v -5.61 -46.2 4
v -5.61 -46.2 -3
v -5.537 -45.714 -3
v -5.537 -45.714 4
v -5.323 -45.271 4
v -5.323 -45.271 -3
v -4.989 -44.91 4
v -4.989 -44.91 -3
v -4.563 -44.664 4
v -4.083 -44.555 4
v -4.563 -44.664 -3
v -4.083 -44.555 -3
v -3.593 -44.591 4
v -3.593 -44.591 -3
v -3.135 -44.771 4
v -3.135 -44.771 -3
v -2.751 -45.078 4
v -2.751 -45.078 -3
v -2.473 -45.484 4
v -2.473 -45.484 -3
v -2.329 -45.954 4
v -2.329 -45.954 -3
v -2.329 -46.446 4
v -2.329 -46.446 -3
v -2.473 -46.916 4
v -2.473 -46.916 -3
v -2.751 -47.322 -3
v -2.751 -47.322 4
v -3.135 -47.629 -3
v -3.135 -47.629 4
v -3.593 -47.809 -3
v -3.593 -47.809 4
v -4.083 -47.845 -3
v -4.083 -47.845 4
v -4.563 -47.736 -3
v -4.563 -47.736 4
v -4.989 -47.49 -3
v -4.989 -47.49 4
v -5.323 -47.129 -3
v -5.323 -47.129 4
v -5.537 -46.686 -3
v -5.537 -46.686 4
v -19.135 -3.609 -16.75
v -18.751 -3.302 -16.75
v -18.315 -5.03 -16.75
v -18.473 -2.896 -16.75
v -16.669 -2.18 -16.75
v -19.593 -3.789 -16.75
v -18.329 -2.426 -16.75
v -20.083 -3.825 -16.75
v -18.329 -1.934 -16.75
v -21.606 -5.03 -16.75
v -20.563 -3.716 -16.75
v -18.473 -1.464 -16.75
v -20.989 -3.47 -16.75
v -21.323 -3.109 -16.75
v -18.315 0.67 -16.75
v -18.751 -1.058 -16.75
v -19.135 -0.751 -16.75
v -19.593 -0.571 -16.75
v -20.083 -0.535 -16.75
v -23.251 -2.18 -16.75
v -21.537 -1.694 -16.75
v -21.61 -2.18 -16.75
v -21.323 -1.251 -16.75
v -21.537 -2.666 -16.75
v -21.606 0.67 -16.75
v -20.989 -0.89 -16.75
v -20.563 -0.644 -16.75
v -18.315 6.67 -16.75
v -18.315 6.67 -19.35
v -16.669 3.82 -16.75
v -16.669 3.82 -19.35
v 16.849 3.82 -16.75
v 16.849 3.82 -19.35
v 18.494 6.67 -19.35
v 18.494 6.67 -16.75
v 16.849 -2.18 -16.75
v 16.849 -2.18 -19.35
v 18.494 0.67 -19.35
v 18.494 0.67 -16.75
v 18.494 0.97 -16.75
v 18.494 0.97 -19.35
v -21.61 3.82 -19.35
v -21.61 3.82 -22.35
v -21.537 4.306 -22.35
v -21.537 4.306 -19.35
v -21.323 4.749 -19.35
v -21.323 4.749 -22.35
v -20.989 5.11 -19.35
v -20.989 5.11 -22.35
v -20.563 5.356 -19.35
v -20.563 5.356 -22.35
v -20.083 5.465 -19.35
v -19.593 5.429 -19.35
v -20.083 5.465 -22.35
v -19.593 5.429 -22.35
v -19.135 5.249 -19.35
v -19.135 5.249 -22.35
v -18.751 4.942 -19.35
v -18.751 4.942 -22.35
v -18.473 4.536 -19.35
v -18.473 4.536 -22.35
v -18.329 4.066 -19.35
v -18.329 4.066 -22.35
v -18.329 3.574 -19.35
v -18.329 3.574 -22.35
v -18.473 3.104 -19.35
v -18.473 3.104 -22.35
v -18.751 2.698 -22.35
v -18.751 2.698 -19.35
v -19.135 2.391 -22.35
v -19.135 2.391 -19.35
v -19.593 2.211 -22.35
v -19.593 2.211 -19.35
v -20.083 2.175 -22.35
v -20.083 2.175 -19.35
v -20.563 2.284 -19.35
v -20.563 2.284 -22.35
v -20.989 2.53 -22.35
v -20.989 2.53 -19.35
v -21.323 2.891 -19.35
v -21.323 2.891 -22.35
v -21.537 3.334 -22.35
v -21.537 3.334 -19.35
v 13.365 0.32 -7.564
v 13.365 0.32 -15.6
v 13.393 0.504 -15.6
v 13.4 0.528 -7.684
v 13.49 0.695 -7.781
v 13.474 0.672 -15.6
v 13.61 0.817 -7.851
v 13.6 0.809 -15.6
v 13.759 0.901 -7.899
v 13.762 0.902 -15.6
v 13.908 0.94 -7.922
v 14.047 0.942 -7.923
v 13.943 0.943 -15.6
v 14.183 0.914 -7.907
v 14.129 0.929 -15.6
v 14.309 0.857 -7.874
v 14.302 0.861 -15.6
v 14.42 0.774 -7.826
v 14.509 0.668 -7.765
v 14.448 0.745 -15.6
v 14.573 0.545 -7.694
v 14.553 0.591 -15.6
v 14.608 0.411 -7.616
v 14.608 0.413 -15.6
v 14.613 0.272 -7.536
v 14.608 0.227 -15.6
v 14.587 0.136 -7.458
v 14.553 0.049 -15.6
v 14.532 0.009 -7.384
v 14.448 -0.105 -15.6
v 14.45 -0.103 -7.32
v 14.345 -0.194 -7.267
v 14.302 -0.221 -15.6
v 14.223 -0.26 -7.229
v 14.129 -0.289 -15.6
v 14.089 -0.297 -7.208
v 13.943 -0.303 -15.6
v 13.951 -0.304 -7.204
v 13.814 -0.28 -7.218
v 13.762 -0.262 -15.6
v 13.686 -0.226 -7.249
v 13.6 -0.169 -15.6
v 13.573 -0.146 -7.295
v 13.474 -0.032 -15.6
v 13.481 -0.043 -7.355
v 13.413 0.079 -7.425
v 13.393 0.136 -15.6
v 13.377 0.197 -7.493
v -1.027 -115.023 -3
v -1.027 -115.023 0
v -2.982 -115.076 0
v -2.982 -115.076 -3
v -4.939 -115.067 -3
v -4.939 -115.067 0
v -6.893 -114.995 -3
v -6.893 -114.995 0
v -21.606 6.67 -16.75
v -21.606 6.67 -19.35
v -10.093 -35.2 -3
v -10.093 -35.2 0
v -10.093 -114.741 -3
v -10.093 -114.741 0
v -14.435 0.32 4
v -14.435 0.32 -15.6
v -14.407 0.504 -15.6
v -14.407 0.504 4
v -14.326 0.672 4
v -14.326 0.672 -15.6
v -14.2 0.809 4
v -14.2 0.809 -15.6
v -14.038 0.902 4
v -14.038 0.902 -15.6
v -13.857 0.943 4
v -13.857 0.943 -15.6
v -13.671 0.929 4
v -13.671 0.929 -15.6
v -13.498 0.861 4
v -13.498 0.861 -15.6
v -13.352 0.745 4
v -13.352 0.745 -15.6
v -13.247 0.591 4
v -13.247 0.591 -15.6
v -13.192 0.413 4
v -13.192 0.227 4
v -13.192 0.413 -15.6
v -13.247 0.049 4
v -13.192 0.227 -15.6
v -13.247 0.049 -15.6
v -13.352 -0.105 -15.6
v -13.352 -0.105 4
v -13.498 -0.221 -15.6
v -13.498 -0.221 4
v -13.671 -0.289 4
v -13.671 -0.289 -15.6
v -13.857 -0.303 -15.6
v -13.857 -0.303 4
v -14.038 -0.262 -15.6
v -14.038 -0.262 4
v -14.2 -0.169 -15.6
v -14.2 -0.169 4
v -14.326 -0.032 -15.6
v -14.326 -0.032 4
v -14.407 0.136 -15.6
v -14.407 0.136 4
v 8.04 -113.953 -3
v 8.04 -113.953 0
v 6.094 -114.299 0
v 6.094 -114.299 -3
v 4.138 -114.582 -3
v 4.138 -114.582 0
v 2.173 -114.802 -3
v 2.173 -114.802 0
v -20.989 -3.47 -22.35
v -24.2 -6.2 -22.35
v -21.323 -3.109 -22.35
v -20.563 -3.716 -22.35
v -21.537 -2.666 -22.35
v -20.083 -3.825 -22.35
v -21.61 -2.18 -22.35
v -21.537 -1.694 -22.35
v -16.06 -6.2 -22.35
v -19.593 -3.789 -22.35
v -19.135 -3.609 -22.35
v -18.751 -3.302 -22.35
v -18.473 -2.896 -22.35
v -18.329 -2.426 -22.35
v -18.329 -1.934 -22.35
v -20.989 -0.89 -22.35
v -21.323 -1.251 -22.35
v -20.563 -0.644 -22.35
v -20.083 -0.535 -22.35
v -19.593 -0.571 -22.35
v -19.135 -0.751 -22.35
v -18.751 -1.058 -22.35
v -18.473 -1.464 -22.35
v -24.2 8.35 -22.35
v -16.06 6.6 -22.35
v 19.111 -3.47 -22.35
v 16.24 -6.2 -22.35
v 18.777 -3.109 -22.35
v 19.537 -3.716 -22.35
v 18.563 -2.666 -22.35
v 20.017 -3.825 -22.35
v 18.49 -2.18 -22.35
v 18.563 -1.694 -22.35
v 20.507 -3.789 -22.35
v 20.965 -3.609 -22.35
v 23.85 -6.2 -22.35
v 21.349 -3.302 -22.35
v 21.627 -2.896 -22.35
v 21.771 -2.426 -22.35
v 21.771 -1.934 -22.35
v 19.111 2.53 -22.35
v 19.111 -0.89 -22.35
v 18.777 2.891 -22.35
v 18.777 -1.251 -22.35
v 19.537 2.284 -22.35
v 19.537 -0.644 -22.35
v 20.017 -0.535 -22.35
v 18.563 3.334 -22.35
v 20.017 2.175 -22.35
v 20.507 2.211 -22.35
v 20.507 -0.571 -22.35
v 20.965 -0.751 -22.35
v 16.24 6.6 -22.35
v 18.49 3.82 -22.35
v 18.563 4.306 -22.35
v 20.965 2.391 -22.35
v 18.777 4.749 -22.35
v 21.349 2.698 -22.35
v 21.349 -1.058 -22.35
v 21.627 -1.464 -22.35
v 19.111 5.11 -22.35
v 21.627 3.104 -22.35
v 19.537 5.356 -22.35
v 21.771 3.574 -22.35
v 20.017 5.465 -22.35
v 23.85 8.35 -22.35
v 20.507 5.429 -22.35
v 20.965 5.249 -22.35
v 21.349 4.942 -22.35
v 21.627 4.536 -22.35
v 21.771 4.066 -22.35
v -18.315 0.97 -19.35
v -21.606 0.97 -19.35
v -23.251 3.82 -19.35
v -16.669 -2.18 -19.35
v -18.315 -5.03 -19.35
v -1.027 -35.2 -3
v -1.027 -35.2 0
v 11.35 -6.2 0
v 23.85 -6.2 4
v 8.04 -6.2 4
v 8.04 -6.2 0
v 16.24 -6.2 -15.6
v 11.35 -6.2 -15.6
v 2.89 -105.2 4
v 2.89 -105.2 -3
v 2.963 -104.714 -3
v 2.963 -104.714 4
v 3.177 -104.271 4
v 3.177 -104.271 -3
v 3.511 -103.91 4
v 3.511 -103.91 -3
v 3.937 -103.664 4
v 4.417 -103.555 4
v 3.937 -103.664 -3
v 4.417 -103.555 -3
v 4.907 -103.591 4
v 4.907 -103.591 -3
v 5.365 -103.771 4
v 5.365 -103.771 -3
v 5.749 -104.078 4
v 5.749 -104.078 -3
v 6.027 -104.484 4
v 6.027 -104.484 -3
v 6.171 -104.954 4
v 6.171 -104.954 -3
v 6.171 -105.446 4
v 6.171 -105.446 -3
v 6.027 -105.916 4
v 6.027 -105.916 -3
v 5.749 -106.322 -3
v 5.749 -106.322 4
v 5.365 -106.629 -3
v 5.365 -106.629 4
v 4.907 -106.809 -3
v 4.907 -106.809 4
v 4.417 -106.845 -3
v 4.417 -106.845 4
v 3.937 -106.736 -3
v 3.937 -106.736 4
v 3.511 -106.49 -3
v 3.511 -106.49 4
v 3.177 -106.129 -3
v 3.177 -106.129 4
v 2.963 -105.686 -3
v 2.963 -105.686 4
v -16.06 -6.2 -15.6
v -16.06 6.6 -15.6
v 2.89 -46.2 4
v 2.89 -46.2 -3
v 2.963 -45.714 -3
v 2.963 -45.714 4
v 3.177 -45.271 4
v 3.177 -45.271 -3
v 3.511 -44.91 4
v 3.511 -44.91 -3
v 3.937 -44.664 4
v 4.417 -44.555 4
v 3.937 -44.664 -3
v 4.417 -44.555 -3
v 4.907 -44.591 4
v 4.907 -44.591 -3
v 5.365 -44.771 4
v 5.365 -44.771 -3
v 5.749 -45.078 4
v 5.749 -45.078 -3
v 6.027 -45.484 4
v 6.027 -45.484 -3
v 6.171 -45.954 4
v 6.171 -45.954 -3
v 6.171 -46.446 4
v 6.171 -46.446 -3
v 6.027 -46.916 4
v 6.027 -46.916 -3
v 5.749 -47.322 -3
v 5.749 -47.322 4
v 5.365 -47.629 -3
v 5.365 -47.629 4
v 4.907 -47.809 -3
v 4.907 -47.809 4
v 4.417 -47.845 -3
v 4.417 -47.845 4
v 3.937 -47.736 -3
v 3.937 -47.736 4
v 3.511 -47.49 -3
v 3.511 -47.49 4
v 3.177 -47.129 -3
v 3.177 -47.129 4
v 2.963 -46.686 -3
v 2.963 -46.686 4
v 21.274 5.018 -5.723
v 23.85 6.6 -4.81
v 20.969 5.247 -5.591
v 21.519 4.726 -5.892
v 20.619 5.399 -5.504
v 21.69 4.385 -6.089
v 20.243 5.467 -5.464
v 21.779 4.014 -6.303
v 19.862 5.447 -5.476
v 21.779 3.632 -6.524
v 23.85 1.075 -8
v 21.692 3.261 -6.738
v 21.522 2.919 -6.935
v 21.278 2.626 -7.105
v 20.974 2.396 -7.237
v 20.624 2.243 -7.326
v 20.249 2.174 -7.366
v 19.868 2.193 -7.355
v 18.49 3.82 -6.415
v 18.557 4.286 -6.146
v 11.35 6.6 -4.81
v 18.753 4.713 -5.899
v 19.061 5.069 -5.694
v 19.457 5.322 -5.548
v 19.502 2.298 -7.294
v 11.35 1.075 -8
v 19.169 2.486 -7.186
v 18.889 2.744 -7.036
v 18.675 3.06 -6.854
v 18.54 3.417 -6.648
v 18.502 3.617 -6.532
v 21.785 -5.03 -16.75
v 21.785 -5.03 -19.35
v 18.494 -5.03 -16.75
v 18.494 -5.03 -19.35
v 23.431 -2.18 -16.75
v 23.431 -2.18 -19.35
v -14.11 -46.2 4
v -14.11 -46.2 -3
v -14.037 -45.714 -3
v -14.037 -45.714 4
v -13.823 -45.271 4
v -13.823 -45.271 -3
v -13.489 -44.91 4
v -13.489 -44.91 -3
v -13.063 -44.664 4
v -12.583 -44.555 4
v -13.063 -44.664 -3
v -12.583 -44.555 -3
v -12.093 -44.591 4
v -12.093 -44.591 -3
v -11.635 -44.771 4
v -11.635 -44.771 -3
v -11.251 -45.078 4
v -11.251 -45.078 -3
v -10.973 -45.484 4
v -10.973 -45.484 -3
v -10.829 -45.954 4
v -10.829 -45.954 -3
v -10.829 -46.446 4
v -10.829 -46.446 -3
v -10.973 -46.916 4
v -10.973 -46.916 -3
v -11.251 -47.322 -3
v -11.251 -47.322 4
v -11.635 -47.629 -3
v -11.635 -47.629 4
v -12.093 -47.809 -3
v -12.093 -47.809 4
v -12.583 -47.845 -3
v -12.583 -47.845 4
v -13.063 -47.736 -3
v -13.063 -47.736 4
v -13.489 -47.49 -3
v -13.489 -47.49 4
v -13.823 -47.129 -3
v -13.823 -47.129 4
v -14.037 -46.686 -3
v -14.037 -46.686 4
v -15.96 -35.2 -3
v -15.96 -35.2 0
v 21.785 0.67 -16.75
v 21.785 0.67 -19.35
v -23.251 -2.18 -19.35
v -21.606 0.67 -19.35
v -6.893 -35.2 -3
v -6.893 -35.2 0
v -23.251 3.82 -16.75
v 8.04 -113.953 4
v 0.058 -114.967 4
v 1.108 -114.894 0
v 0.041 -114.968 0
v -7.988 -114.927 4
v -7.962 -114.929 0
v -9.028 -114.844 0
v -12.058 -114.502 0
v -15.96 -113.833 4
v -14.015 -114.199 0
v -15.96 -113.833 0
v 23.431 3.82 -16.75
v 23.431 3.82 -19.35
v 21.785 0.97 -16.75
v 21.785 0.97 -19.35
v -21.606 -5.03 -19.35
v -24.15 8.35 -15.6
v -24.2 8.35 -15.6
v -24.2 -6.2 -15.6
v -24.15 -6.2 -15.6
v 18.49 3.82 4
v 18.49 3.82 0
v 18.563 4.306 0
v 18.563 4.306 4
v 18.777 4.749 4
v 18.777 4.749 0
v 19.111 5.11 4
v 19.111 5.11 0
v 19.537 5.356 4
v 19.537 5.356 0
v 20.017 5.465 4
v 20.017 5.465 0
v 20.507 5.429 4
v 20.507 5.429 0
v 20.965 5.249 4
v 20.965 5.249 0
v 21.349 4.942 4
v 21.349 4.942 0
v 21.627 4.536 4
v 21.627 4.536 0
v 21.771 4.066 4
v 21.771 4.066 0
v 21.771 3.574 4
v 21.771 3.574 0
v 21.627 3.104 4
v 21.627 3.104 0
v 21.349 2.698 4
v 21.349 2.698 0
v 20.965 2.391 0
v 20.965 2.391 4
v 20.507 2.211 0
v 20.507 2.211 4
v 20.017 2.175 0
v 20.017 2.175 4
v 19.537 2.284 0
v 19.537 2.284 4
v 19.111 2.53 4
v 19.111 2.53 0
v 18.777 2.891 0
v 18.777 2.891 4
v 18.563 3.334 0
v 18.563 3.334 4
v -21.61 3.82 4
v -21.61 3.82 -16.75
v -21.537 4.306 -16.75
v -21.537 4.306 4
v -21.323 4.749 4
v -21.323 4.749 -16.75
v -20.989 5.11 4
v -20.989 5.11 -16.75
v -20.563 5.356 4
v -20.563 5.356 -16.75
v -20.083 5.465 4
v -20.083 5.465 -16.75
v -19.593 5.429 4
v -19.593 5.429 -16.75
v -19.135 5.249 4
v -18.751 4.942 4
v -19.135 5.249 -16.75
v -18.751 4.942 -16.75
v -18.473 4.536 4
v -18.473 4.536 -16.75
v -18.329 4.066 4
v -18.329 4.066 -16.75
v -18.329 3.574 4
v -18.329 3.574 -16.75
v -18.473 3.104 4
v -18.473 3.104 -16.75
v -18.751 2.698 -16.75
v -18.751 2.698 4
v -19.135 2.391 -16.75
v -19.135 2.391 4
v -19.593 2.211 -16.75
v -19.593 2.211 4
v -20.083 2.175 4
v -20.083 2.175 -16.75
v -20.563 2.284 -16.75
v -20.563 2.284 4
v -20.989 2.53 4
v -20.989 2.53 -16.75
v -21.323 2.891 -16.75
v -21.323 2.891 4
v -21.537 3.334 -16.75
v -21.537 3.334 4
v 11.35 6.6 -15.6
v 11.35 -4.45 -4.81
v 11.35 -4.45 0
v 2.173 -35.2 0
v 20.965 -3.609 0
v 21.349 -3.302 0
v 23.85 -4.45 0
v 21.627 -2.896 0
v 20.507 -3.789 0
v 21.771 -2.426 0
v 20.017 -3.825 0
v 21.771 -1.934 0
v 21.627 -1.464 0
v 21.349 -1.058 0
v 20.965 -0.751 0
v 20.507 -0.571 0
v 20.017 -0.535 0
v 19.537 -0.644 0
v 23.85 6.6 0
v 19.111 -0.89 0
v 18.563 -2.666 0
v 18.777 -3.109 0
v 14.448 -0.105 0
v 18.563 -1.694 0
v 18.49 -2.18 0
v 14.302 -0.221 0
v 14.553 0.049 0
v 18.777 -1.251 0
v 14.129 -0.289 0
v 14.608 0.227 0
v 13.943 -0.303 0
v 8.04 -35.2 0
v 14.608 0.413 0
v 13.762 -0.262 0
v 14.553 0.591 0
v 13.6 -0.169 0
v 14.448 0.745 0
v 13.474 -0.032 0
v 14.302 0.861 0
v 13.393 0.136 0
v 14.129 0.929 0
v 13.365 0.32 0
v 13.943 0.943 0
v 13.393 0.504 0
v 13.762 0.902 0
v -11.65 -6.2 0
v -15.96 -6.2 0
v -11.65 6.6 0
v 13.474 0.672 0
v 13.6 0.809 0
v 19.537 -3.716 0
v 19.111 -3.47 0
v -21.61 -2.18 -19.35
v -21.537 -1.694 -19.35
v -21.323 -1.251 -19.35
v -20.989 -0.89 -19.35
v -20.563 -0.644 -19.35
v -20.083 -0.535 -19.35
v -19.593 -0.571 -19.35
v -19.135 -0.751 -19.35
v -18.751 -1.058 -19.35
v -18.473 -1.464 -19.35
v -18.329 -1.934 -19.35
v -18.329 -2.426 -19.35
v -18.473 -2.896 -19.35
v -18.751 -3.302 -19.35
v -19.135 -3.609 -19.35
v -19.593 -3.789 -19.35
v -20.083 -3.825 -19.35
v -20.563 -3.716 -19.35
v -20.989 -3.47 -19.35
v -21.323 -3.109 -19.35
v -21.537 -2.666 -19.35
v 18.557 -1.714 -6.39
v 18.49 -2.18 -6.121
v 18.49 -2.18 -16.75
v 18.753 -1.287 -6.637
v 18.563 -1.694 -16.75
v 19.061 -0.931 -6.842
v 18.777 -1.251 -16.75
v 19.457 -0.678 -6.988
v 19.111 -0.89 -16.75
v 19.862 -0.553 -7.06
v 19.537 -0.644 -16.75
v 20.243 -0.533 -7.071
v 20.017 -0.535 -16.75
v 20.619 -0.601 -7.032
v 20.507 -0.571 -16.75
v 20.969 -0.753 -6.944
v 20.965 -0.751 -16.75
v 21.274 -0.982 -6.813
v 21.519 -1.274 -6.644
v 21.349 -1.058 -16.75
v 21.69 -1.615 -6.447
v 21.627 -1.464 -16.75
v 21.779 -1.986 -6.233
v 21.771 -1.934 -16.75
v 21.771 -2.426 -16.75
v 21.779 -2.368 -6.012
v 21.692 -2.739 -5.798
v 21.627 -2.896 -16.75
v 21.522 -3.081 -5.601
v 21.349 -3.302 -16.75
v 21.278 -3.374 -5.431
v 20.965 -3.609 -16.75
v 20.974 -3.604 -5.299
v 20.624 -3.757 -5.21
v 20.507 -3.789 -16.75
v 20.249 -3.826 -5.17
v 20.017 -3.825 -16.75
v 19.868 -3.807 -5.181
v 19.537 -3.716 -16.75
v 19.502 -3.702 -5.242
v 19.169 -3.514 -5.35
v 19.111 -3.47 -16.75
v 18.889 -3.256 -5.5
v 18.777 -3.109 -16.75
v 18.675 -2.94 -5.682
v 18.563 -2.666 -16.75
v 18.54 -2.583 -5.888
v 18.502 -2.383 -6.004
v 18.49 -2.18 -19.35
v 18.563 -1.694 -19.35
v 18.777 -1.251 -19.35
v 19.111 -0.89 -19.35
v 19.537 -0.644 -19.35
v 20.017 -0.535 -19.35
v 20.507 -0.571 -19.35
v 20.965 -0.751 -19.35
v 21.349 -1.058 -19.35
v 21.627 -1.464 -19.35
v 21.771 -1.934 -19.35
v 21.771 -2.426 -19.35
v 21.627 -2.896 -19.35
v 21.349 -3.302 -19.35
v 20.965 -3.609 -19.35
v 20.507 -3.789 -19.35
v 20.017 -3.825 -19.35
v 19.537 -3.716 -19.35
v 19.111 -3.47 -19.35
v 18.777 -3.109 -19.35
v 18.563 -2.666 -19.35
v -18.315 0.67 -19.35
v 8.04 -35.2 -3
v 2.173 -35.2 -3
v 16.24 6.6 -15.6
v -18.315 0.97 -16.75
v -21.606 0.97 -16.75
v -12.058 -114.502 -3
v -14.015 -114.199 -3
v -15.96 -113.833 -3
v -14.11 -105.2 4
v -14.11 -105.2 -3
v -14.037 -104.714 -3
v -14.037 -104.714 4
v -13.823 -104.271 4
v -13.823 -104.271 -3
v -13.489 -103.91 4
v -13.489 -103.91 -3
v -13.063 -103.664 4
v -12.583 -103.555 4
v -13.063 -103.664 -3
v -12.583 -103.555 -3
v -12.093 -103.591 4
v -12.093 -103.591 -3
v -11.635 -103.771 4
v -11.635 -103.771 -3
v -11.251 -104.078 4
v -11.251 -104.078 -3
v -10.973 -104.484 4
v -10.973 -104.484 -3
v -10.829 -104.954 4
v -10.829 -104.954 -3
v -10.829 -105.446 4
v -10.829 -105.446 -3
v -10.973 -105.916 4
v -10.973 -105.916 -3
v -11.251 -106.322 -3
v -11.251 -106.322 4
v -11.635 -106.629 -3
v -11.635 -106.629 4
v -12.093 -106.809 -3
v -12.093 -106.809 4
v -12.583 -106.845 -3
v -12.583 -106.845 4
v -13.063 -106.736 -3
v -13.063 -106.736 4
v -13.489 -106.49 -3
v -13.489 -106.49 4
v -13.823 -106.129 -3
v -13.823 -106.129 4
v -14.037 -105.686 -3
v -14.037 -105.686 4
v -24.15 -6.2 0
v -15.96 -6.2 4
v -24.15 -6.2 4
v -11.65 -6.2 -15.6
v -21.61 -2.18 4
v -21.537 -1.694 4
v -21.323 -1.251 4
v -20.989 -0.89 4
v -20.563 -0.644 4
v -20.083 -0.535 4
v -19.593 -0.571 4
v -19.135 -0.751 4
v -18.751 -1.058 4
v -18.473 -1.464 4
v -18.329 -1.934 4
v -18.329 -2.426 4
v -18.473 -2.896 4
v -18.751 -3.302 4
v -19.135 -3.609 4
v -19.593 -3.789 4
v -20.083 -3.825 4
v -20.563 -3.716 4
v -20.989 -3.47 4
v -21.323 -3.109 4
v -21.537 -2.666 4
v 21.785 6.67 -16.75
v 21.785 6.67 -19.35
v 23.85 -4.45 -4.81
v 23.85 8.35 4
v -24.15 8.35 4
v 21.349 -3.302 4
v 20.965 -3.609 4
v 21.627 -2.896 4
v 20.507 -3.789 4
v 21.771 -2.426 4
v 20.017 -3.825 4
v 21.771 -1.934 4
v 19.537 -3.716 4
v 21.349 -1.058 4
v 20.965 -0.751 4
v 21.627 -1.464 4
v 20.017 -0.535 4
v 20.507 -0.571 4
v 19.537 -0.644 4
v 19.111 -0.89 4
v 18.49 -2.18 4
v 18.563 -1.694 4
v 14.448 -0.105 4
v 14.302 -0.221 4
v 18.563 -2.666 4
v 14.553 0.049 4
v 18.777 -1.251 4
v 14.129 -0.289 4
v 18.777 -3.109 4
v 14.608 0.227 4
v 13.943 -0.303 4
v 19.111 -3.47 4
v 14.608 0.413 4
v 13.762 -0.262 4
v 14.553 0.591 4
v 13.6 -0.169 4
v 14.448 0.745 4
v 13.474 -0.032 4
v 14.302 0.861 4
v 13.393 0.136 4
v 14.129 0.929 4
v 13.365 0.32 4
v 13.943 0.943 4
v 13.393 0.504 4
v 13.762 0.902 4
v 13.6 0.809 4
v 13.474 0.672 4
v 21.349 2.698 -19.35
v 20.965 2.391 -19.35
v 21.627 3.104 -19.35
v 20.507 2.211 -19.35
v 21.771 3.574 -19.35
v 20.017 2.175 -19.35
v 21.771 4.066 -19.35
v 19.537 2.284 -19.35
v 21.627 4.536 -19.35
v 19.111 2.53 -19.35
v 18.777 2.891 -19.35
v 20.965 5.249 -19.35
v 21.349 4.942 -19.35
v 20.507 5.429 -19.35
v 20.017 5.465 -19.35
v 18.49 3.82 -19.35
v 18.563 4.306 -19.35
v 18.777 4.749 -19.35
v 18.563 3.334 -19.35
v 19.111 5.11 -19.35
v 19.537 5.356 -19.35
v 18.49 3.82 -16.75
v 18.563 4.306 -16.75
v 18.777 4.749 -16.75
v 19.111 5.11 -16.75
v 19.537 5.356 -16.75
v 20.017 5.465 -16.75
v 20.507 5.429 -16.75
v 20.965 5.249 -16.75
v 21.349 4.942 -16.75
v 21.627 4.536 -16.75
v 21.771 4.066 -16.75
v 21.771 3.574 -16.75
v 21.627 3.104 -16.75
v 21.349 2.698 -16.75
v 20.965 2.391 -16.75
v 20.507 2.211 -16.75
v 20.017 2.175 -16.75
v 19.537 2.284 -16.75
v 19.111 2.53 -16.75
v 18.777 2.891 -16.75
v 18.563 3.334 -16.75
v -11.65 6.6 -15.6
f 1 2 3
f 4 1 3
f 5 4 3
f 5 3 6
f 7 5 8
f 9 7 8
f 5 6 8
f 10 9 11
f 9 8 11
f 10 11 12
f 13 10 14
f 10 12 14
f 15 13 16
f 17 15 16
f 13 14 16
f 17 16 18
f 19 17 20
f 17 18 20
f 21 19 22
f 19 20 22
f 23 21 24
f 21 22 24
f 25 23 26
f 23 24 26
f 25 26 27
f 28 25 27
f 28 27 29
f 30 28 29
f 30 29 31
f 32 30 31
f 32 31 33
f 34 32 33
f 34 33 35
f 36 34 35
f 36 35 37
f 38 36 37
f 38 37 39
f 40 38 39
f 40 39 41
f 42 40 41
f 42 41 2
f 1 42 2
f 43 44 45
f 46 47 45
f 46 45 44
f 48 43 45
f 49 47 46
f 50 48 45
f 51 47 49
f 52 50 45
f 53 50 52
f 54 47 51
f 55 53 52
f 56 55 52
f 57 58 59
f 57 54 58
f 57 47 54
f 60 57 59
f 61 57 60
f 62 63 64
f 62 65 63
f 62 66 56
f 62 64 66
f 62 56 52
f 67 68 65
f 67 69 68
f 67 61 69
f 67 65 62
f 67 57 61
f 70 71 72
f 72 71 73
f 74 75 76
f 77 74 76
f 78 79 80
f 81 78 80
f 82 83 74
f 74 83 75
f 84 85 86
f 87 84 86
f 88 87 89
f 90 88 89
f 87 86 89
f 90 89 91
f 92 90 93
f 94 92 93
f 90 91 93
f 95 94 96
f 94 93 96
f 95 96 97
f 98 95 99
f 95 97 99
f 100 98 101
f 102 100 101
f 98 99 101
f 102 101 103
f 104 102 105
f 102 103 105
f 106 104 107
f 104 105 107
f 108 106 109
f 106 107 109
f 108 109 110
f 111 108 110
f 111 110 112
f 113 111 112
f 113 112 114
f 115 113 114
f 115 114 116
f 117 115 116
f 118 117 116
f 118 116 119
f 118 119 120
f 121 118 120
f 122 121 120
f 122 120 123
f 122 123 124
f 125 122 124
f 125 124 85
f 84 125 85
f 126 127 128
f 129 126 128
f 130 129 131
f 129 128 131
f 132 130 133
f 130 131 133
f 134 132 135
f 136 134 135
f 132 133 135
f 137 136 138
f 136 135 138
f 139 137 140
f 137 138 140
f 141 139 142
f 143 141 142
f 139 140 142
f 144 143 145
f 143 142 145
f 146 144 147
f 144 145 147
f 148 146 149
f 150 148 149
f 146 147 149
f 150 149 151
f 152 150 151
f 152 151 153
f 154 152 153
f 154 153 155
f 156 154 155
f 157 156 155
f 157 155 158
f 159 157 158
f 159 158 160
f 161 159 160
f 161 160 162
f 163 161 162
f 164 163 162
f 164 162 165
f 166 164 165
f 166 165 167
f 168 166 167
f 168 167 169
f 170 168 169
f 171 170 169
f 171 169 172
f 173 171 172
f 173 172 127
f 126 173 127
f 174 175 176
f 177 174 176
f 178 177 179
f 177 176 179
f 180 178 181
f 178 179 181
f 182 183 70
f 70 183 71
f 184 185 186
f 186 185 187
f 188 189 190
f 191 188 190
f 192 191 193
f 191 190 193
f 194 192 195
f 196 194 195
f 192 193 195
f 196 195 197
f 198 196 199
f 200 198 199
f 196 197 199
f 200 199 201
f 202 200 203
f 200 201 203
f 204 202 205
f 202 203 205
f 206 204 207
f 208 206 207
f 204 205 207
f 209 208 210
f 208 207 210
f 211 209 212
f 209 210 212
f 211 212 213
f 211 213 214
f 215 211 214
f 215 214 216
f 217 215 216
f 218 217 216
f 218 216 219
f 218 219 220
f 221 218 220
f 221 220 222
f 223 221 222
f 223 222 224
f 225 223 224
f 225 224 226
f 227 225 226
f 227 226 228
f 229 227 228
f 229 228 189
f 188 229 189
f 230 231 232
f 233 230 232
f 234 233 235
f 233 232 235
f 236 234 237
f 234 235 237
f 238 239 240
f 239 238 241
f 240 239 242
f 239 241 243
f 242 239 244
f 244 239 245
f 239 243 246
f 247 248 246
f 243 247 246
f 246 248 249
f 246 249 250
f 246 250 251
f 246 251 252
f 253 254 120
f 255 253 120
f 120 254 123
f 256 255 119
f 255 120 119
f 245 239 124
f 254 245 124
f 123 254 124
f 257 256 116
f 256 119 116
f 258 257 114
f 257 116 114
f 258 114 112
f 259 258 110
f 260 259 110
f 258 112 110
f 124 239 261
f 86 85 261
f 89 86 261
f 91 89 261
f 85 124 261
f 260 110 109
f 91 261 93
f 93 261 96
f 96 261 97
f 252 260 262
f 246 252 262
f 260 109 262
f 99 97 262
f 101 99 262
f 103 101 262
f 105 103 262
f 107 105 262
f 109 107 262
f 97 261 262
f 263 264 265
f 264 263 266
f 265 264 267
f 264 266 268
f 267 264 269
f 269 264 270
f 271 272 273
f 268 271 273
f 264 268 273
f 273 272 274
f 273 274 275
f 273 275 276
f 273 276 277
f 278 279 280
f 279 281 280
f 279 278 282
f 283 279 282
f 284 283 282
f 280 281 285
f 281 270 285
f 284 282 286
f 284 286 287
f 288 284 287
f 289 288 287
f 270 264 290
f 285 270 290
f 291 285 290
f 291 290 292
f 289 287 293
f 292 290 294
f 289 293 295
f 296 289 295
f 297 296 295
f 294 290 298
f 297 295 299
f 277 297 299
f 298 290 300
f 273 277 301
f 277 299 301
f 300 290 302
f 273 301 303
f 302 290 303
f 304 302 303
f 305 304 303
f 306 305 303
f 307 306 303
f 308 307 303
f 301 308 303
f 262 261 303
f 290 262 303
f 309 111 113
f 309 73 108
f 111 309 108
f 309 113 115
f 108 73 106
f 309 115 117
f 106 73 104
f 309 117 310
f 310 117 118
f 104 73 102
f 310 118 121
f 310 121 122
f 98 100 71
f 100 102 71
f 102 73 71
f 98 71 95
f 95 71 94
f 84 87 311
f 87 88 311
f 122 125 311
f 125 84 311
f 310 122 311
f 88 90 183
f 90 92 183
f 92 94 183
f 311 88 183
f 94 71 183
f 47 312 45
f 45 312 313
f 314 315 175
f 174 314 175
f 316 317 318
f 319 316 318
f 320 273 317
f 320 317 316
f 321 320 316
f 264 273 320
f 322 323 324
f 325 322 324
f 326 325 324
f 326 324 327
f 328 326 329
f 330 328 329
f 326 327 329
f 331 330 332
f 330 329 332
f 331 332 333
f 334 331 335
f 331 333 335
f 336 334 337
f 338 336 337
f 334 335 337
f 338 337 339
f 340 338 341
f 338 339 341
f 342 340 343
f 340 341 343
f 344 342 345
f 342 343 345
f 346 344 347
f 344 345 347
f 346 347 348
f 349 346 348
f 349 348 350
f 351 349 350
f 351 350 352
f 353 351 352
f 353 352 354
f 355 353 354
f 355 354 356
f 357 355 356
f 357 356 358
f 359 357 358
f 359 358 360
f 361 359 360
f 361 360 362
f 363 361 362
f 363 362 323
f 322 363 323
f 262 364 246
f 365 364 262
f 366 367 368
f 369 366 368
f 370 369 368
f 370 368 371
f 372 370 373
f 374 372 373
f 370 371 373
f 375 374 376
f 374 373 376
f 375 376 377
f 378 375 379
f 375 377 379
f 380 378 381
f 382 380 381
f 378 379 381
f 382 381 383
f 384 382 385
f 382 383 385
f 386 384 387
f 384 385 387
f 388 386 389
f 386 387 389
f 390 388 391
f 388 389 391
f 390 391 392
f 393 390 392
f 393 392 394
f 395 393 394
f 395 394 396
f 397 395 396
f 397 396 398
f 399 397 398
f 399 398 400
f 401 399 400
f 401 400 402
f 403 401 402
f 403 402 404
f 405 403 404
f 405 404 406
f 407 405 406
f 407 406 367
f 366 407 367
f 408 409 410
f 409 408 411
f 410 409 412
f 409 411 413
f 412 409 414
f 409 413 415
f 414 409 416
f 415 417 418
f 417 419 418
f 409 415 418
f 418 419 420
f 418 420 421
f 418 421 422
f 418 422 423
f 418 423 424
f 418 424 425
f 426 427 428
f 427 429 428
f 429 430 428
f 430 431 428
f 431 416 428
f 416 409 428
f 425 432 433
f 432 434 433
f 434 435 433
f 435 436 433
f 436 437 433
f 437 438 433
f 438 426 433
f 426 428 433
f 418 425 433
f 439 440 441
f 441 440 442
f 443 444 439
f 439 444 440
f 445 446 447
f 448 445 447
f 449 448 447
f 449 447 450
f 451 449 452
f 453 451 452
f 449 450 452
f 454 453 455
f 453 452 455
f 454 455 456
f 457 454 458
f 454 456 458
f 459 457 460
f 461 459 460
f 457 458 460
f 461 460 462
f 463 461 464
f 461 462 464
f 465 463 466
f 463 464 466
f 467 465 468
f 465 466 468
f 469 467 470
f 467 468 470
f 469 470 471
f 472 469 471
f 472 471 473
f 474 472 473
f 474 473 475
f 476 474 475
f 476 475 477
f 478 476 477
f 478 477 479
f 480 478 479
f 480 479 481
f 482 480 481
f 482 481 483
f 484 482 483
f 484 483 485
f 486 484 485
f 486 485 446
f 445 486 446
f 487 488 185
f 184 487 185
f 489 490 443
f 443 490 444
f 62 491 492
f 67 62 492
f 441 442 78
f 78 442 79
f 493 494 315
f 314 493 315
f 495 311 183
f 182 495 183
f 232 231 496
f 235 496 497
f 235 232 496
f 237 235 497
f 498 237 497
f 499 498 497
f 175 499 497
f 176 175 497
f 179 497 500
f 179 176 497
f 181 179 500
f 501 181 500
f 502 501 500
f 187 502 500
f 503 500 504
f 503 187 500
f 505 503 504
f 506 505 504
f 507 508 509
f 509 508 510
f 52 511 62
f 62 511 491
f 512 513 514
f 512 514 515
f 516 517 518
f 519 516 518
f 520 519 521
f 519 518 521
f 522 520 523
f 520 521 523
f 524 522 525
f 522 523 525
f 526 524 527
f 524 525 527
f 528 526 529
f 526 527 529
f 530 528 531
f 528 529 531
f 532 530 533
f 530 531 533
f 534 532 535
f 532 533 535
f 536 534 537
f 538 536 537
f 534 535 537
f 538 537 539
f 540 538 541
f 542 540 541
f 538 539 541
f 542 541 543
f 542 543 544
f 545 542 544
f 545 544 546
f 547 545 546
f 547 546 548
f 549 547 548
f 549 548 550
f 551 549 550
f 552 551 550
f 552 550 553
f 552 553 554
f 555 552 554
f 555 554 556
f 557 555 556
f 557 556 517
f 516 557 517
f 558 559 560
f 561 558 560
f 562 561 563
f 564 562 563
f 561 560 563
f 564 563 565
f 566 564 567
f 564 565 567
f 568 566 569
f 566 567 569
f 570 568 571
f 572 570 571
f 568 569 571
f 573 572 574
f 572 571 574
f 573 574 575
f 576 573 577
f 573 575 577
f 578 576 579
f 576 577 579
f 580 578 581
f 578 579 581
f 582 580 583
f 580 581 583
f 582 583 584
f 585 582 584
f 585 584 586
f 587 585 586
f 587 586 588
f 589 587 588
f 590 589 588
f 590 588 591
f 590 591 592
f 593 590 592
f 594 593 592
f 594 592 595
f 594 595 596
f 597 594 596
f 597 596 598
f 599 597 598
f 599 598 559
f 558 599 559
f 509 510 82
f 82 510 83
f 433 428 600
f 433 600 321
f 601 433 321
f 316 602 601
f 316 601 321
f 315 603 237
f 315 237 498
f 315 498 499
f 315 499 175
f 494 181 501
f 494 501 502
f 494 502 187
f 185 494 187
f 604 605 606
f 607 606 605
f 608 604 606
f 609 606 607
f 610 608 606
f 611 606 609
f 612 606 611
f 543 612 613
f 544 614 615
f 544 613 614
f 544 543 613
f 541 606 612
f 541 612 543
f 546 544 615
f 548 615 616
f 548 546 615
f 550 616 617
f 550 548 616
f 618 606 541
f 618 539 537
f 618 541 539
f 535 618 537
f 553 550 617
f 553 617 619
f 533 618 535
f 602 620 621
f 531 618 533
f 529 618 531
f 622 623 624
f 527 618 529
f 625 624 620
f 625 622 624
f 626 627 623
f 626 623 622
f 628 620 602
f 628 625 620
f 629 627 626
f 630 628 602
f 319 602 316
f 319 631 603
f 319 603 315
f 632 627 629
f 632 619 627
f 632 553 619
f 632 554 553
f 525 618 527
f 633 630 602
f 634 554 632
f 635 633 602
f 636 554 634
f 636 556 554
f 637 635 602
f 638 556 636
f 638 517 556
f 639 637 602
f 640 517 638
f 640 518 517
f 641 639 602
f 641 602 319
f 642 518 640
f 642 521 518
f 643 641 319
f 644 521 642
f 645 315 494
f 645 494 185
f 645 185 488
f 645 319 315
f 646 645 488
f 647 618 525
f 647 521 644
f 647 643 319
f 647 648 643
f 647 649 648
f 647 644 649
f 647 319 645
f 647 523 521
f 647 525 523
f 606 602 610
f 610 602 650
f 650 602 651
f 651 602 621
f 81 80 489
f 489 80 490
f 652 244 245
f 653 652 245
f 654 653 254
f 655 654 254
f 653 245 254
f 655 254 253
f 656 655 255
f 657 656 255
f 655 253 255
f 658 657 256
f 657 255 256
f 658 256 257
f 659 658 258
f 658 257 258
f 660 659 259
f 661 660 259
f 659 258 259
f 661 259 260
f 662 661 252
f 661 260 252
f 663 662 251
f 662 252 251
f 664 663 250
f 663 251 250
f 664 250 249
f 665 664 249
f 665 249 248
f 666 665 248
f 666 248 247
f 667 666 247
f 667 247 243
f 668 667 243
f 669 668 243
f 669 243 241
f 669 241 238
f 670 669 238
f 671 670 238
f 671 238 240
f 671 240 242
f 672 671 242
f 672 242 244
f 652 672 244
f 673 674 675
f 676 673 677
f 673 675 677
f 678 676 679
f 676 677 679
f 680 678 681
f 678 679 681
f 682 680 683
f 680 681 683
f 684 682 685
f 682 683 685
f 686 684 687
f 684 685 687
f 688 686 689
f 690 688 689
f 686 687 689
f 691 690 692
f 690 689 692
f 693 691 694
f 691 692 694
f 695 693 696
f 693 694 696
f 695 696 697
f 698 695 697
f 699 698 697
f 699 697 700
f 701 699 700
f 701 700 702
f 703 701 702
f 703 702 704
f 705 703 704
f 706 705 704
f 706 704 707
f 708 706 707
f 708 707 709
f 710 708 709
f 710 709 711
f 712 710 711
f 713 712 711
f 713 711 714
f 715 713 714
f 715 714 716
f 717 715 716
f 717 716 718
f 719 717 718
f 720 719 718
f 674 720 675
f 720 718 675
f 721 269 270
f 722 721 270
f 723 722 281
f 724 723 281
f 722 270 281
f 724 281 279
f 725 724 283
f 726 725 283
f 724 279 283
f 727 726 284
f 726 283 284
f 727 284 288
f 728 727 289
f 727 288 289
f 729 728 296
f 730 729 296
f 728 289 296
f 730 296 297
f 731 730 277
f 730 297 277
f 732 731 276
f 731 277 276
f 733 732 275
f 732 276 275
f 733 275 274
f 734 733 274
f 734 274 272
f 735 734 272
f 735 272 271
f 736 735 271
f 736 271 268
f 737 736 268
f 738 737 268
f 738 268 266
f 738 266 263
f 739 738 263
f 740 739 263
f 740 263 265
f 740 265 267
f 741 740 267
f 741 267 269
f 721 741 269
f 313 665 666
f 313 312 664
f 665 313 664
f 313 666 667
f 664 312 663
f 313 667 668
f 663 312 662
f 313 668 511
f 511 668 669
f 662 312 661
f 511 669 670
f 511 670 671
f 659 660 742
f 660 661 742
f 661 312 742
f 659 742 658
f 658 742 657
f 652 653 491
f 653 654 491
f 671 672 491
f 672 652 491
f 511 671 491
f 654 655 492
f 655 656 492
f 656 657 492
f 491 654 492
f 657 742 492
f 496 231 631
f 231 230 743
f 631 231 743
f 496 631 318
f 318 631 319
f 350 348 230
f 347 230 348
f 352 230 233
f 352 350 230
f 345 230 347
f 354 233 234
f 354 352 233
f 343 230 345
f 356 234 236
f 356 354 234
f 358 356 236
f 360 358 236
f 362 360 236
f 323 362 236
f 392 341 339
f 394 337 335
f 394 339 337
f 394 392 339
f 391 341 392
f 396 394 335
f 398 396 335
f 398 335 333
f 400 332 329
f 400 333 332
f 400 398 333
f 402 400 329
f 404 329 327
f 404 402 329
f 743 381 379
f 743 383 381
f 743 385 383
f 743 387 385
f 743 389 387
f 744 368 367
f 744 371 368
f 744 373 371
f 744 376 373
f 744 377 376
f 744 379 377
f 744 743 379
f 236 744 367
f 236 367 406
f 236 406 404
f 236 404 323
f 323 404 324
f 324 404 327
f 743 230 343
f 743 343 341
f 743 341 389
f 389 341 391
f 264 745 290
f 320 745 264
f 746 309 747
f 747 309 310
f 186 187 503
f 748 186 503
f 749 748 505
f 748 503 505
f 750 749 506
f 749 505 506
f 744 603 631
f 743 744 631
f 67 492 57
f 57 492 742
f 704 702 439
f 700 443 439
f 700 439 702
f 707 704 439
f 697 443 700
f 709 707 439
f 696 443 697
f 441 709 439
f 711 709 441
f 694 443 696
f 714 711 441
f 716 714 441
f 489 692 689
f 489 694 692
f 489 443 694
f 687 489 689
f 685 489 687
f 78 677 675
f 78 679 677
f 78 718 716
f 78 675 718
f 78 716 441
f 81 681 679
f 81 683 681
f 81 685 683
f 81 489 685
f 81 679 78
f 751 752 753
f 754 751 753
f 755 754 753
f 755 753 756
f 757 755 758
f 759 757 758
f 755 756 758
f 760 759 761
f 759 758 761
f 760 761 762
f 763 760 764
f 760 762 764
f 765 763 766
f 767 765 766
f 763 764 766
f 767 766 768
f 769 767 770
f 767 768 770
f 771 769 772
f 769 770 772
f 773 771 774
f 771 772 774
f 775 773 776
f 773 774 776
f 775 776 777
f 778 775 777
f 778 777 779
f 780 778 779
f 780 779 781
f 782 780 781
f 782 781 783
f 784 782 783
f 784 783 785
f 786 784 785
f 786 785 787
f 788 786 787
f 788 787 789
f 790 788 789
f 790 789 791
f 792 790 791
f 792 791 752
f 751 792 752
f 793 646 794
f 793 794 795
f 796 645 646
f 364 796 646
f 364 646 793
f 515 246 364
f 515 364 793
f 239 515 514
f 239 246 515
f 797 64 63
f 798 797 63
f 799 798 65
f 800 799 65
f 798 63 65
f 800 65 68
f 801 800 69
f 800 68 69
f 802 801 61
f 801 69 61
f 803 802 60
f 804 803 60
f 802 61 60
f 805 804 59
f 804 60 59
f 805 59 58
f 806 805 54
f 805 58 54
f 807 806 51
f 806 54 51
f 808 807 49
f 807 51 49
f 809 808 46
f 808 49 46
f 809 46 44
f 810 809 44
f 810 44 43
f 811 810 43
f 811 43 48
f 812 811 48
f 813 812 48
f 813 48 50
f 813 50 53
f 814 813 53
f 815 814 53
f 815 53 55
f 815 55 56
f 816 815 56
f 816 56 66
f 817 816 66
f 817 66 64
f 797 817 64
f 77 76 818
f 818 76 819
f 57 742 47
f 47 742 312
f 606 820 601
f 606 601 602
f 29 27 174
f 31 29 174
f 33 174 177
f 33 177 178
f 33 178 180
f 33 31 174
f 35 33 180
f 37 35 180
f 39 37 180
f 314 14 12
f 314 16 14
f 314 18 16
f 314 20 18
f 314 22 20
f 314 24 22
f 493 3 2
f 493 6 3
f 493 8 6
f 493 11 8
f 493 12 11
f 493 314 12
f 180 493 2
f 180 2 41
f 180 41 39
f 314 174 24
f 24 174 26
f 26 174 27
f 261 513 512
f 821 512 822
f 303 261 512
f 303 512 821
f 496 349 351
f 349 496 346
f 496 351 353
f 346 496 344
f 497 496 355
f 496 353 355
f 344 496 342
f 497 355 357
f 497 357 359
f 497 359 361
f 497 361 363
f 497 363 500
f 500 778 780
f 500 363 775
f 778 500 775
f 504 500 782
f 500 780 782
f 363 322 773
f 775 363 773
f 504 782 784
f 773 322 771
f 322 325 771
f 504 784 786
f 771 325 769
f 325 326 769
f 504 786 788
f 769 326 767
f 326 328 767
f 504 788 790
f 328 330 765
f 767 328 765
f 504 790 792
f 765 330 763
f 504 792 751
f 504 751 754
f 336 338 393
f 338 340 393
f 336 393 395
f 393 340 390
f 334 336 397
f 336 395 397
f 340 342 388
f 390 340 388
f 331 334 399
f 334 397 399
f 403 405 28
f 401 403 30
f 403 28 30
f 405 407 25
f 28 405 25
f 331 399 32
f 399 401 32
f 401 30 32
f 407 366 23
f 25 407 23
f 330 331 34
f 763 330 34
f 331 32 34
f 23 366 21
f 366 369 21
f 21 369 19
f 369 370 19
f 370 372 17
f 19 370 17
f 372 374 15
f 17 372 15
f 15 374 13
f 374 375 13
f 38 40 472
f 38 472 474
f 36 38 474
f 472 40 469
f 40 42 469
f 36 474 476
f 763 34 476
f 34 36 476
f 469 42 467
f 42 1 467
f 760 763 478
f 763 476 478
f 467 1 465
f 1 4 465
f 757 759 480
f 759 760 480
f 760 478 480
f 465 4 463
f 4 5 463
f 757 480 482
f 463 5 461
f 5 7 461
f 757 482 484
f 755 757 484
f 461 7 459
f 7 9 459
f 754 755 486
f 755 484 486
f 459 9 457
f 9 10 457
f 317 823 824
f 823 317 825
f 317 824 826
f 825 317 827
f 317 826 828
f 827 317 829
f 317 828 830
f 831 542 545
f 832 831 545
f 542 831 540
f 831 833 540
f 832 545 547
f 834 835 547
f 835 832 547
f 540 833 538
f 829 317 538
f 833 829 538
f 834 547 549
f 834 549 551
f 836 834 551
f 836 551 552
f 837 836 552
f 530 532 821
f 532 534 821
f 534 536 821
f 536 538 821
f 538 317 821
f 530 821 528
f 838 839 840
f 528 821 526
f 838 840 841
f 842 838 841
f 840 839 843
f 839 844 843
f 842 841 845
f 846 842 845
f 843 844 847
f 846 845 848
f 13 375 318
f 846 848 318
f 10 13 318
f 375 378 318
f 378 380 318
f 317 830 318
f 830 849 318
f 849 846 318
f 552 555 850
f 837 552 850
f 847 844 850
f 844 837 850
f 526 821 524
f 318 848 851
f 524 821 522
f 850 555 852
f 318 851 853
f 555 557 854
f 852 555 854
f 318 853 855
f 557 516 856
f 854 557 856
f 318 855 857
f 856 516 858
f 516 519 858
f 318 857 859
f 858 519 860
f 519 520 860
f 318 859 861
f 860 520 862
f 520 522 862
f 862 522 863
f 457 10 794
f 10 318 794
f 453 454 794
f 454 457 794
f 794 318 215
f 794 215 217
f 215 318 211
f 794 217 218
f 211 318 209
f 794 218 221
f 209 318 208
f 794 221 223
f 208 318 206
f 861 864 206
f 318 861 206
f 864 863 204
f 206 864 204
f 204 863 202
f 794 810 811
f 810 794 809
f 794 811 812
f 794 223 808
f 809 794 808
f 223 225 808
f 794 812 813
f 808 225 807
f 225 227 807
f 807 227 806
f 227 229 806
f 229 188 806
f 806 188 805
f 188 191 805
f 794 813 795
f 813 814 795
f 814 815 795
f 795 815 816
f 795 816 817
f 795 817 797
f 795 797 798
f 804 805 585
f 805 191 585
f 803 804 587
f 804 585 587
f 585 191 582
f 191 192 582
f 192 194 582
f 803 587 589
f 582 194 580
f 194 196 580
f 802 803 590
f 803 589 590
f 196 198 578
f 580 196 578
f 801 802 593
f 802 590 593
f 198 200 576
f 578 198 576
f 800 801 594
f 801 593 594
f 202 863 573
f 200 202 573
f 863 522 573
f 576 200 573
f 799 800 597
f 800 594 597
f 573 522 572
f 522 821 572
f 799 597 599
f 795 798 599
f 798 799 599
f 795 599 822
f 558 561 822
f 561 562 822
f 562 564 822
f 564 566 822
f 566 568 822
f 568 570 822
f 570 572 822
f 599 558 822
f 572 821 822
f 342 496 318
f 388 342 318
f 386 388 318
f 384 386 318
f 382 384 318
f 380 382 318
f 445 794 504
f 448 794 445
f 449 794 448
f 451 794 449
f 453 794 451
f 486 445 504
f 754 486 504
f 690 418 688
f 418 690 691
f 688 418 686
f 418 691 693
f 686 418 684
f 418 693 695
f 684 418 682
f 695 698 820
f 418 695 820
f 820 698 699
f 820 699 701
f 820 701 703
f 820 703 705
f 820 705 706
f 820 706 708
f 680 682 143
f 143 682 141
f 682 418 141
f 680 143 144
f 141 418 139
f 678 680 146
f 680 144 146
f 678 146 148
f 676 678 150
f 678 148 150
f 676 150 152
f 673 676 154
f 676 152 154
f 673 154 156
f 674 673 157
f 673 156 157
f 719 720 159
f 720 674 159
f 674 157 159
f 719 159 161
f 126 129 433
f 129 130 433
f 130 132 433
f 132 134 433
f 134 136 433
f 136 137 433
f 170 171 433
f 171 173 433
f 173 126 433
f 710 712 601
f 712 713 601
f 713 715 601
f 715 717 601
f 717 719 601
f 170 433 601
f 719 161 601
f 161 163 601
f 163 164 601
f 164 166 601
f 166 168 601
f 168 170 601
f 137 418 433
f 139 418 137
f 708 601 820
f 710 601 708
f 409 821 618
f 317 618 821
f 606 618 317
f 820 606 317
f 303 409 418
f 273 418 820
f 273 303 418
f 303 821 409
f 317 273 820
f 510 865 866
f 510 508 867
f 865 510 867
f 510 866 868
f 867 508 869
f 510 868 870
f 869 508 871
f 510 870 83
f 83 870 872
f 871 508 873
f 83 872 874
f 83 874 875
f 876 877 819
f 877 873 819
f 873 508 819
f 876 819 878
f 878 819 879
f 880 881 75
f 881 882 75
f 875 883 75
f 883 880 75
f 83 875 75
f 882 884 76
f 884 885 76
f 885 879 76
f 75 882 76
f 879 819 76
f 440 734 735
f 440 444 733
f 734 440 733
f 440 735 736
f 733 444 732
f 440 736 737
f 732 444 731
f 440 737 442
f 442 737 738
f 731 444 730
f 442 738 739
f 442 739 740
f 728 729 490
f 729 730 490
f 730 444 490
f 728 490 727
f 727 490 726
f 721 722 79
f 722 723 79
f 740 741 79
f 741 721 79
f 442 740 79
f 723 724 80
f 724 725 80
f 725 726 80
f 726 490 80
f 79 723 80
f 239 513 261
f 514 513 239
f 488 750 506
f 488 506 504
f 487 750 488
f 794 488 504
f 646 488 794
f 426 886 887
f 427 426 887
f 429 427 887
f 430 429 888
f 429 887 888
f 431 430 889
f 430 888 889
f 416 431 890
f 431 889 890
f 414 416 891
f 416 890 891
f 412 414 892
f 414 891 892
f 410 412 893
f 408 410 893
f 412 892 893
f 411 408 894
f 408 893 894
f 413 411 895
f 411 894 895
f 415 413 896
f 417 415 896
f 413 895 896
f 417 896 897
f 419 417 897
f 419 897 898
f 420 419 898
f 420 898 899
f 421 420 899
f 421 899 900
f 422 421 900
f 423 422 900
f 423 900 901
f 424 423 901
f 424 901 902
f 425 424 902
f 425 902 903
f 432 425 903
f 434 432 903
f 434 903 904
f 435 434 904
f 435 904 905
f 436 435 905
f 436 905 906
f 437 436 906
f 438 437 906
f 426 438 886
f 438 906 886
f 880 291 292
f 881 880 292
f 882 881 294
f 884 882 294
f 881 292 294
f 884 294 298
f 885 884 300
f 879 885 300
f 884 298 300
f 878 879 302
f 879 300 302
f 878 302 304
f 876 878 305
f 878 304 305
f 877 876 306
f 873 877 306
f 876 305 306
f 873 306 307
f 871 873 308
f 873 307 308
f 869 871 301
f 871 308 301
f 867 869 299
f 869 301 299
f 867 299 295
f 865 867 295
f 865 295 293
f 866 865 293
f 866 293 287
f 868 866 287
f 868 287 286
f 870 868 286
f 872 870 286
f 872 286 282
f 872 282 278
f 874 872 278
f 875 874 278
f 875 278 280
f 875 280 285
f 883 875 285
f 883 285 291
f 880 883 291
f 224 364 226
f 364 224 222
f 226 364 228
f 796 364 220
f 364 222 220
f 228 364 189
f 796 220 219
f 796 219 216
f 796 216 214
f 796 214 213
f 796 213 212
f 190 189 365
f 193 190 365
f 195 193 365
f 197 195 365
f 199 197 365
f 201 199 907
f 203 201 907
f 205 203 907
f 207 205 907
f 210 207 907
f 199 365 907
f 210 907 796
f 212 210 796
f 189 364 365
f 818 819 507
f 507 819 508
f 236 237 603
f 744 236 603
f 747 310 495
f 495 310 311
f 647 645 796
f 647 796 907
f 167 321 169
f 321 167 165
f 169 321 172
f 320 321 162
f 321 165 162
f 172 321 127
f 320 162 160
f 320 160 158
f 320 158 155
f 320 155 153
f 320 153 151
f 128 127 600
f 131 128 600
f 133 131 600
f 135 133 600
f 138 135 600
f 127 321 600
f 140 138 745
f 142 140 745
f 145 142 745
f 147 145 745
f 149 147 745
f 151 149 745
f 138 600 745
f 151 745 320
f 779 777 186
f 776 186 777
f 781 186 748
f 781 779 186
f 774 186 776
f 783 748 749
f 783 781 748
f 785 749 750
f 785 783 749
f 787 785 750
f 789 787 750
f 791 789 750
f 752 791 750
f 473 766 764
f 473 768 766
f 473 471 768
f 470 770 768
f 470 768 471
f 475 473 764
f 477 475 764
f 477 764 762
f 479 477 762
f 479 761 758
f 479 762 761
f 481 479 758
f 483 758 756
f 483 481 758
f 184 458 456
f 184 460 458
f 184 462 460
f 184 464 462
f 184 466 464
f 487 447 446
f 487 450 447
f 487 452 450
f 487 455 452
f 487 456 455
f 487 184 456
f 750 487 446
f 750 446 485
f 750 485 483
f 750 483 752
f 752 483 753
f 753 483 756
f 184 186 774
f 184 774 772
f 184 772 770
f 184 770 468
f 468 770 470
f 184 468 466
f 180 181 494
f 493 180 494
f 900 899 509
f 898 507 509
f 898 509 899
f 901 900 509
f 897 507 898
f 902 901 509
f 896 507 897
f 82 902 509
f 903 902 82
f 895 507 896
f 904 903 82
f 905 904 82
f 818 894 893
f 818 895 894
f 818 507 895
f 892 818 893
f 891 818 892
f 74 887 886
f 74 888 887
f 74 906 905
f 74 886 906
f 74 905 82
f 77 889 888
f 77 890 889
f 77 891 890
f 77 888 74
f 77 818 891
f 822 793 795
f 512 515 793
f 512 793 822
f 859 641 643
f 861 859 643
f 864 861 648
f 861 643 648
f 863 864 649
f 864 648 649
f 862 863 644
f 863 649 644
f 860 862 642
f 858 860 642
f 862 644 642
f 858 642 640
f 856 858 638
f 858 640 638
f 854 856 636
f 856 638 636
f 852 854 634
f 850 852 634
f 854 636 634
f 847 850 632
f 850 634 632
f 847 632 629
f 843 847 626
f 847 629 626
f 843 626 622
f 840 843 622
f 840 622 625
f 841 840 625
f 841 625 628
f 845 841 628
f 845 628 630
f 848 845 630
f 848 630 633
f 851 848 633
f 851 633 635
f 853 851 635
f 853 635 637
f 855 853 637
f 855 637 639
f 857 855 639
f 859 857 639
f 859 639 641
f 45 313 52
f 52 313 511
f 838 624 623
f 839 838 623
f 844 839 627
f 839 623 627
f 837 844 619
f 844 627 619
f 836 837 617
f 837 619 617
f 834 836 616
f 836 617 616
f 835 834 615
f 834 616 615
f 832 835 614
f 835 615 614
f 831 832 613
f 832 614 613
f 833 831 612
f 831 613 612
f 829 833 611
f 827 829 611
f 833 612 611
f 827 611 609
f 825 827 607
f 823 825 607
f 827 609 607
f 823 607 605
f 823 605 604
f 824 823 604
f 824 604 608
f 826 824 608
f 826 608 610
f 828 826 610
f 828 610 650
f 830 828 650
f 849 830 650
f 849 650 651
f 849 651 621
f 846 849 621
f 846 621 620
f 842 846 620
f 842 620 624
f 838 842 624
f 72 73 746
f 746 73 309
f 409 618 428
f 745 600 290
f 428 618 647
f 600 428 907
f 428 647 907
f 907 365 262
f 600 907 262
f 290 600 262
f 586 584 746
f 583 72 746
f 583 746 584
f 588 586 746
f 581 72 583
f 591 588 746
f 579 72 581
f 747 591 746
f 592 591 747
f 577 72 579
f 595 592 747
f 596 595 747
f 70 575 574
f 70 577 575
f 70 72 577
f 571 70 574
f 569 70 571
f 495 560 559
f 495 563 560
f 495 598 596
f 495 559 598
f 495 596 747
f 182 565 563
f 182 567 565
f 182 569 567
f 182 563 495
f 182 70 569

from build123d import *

# Parameters (mm, degrees)
BOSS_EXTRUDE1_DEPTH = 15.6
BOSS_EXTRUDE2_DEPTH = 6.75
BOSS_EXTRUDE3_DEPTH = 4
BOSS_EXTRUDE4_DEPTH = 3
SKETCH5_R           = 1.65
CUT_EXTRUDE1_DEPTH  = 8
SKETCH6_R           = 1.65
CUT_EXTRUDE2_DEPTH  = 27.35
CUT_EXTRUDE3_START  = -3
CUT_EXTRUDE3_DEPTH  = 2.6
CUT_EXTRUDE4_DEPTH  = 20
SKETCH9_W           = 15.8100889
SKETCH9_H           = 107.753083684
SKETCH9_W_2         = 8.2399111
SKETCH9_H_2         = 107.633309651
CUT_EXTRUDE5_DEPTH  = 10
SKETCH10_R          = 0.625
CUT_EXTRUDE6_DEPTH  = 30


with BuildPart() as part:
    # Sketch1 → Boss-Extrude1 (new body)
    with BuildSketch(Plane.XY):
        Polygon((-11.65, 6.6), (11.35, 6.6), (11.35, -6.2), (23.85, -6.2), (23.85, 8.35), (-24.15, 8.35), (-24.15, -6.2), (-11.65, -6.2), align=None)
    extrude(amount=-BOSS_EXTRUDE1_DEPTH)

    # Sketch2 → Boss-Extrude2 (add)
    with BuildSketch(Plane(origin=(0, 0, -15.6), x_dir=(-1, 0, 0), z_dir=(0, 0, -1))):
        Polygon((-16.2399111, -6.2), (-23.85, -6.2), (-23.85, 8.35), (24.2, 8.35), (24.2, -6.2), (16.0600889, -6.2), (16.0600889, 6.6), (-16.2399111, 6.6), align=None)
    extrude(amount=BOSS_EXTRUDE2_DEPTH)

    # Sketch3 → Boss-Extrude3 (add)
    with BuildSketch(Plane.XY):
        with BuildLine():
            Line((-24.15, 8.35), (23.85, 8.35))
            Line((23.85, 8.35), (23.85, 1.000334142))
            Line((23.85, 1.000334142), (23.85, -108.560334142))
            ThreePointArc((23.85, -108.560334142), (0.155860803, -114.961112509), (-24.15, -111.554159822))
            Line((-24.15, -111.554159822), (-24.15, 3.741161814))
            Line((-24.15, 3.741161814), (-24.15, 8.35))
        make_face()
    extrude(amount=BOSS_EXTRUDE3_DEPTH)

    # Sketch4 → Boss-Extrude4 (add)
    with BuildSketch(Plane(origin=(0, 0, 0), x_dir=(-1, 0, 0), z_dir=(0, 0, -1))):
        with BuildLine():
            ThreePointArc((10.093422233, -114.741481463), (13.037755905, -114.358456249), (15.9600889, -113.833309651))
            Line((15.9600889, -113.833309651), (15.9600889, -35.2))
            Line((15.9600889, -35.2), (10.093422233, -35.2))
            Line((10.093422233, -35.2), (10.093422233, -114.741481463))
        make_face()
        with BuildLine():
            ThreePointArc((1.026755567, -115.023412344), (3.960432973, -115.079264216), (6.893422233, -114.994667814))
            Line((6.893422233, -114.994667814), (6.893422233, -35.2))
            Line((6.893422233, -35.2), (1.026755567, -35.2))
            Line((1.026755567, -35.2), (1.026755567, -115.023412344))
        make_face()
        with BuildLine():
            ThreePointArc((-8.0399111, -113.953083684), (-5.116842896, -114.448405849), (-2.173244433, -114.801817592))
            Line((-2.173244433, -114.801817592), (-2.173244433, -35.2))
            Line((-2.173244433, -35.2), (-8.0399111, -35.2))
            Line((-8.0399111, -35.2), (-8.0399111, -113.953083684))
        make_face()
    extrude(amount=BOSS_EXTRUDE4_DEPTH)

    # Sketch5 → Cut-Extrude1 (cut, through all)
    with BuildSketch(Plane(origin=(0, 0, -3), x_dir=(-1, 0, 0), z_dir=(0, 0, -1))):
        with Locations((3.9600889, -46.2)):
            Circle(SKETCH5_R)
        with Locations((12.4600889, -46.2)):
            Circle(SKETCH5_R)
        with Locations((-4.5399111, -46.2)):
            Circle(SKETCH5_R)
        with Locations((12.4600889, -105.2)):
            Circle(SKETCH5_R)
        with Locations((-4.5399111, -105.2)):
            Circle(SKETCH5_R)
    extrude(amount=-CUT_EXTRUDE1_DEPTH, mode=Mode.SUBTRACT)

    # Sketch6 → Cut-Extrude2 (cut, through all)
    with BuildSketch(Plane(origin=(0, 0, -22.35), x_dir=(-1, 0, 0), z_dir=(0, 0, -1))):
        with Locations((-20.1399111, -2.18)):
            Circle(SKETCH6_R)
        with Locations((-20.1399111, 3.82)):
            Circle(SKETCH6_R)
        with Locations((19.9600889, -2.18)):
            Circle(SKETCH6_R)
        with Locations((19.9600889, 3.82)):
            Circle(SKETCH6_R)
    extrude(amount=-CUT_EXTRUDE2_DEPTH, mode=Mode.SUBTRACT)

    # Sketch7 → Cut-Extrude3 (cut)
    with BuildSketch(Plane(origin=(0, 0, -22.35), x_dir=(-1, 0, 0), z_dir=(0, 0, -1)).offset(CUT_EXTRUDE3_START)):
        Polygon((18.314640633, 0.67), (16.669192365, -2.18), (18.314640633, -5.03), (21.605537167, -5.03), (23.250985434, -2.18), (21.605537167, 0.67), align=None)
        Polygon((21.605537167, 6.67), (18.314640633, 6.67), (16.669192365, 3.82), (18.314640633, 0.97), (21.605537167, 0.97), (23.250985434, 3.82), align=None)
        Polygon((-21.785359367, 6.67), (-23.430807635, 3.82), (-21.785359367, 0.97), (-18.494462833, 0.97), (-16.849014566, 3.82), (-18.494462833, 6.67), align=None)
        Polygon((-21.785359367, 0.67), (-23.430807635, -2.18), (-21.785359367, -5.03), (-18.494462833, -5.03), (-16.849014566, -2.18), (-18.494462833, 0.67), align=None)
    extrude(amount=-CUT_EXTRUDE3_DEPTH, mode=Mode.SUBTRACT)

    # Sketch8 → Cut-Extrude4 (cut)
    with BuildSketch(Plane.ZY.offset(-11.35)):
        Polygon((0, 6.6), (-4.810139763, 6.6), (-8, 1.075), (-4.810139763, -4.45), (0, -4.45), align=None)
    extrude(amount=-CUT_EXTRUDE4_DEPTH, mode=Mode.SUBTRACT)

    # Sketch9 → Cut-Extrude5 (cut)
    with BuildSketch(Plane(origin=(0, 0, 0), x_dir=(-1, 0, 0), z_dir=(0, 0, -1))):
        with Locations((-15.94495555, -60.076541842)):
            Rectangle(SKETCH9_W, SKETCH9_H)
        with Locations((20.08004445, -60.016654826)):
            Rectangle(SKETCH9_W_2, SKETCH9_H_2)
    extrude(amount=-CUT_EXTRUDE5_DEPTH, mode=Mode.SUBTRACT)

    # Sketch10 → Cut-Extrude6 (cut)
    with BuildSketch(Plane(origin=(0, 0, -15.6), x_dir=(-1, 0, 0), z_dir=(0, 0, -1))):
        with Locations((13.8100889, 0.32)):
            Circle(SKETCH10_R)
        with Locations((-13.9899111, 0.32)):
            Circle(SKETCH10_R)
    extrude(amount=-CUT_EXTRUDE6_DEPTH, mode=Mode.SUBTRACT)


solid = part.part
